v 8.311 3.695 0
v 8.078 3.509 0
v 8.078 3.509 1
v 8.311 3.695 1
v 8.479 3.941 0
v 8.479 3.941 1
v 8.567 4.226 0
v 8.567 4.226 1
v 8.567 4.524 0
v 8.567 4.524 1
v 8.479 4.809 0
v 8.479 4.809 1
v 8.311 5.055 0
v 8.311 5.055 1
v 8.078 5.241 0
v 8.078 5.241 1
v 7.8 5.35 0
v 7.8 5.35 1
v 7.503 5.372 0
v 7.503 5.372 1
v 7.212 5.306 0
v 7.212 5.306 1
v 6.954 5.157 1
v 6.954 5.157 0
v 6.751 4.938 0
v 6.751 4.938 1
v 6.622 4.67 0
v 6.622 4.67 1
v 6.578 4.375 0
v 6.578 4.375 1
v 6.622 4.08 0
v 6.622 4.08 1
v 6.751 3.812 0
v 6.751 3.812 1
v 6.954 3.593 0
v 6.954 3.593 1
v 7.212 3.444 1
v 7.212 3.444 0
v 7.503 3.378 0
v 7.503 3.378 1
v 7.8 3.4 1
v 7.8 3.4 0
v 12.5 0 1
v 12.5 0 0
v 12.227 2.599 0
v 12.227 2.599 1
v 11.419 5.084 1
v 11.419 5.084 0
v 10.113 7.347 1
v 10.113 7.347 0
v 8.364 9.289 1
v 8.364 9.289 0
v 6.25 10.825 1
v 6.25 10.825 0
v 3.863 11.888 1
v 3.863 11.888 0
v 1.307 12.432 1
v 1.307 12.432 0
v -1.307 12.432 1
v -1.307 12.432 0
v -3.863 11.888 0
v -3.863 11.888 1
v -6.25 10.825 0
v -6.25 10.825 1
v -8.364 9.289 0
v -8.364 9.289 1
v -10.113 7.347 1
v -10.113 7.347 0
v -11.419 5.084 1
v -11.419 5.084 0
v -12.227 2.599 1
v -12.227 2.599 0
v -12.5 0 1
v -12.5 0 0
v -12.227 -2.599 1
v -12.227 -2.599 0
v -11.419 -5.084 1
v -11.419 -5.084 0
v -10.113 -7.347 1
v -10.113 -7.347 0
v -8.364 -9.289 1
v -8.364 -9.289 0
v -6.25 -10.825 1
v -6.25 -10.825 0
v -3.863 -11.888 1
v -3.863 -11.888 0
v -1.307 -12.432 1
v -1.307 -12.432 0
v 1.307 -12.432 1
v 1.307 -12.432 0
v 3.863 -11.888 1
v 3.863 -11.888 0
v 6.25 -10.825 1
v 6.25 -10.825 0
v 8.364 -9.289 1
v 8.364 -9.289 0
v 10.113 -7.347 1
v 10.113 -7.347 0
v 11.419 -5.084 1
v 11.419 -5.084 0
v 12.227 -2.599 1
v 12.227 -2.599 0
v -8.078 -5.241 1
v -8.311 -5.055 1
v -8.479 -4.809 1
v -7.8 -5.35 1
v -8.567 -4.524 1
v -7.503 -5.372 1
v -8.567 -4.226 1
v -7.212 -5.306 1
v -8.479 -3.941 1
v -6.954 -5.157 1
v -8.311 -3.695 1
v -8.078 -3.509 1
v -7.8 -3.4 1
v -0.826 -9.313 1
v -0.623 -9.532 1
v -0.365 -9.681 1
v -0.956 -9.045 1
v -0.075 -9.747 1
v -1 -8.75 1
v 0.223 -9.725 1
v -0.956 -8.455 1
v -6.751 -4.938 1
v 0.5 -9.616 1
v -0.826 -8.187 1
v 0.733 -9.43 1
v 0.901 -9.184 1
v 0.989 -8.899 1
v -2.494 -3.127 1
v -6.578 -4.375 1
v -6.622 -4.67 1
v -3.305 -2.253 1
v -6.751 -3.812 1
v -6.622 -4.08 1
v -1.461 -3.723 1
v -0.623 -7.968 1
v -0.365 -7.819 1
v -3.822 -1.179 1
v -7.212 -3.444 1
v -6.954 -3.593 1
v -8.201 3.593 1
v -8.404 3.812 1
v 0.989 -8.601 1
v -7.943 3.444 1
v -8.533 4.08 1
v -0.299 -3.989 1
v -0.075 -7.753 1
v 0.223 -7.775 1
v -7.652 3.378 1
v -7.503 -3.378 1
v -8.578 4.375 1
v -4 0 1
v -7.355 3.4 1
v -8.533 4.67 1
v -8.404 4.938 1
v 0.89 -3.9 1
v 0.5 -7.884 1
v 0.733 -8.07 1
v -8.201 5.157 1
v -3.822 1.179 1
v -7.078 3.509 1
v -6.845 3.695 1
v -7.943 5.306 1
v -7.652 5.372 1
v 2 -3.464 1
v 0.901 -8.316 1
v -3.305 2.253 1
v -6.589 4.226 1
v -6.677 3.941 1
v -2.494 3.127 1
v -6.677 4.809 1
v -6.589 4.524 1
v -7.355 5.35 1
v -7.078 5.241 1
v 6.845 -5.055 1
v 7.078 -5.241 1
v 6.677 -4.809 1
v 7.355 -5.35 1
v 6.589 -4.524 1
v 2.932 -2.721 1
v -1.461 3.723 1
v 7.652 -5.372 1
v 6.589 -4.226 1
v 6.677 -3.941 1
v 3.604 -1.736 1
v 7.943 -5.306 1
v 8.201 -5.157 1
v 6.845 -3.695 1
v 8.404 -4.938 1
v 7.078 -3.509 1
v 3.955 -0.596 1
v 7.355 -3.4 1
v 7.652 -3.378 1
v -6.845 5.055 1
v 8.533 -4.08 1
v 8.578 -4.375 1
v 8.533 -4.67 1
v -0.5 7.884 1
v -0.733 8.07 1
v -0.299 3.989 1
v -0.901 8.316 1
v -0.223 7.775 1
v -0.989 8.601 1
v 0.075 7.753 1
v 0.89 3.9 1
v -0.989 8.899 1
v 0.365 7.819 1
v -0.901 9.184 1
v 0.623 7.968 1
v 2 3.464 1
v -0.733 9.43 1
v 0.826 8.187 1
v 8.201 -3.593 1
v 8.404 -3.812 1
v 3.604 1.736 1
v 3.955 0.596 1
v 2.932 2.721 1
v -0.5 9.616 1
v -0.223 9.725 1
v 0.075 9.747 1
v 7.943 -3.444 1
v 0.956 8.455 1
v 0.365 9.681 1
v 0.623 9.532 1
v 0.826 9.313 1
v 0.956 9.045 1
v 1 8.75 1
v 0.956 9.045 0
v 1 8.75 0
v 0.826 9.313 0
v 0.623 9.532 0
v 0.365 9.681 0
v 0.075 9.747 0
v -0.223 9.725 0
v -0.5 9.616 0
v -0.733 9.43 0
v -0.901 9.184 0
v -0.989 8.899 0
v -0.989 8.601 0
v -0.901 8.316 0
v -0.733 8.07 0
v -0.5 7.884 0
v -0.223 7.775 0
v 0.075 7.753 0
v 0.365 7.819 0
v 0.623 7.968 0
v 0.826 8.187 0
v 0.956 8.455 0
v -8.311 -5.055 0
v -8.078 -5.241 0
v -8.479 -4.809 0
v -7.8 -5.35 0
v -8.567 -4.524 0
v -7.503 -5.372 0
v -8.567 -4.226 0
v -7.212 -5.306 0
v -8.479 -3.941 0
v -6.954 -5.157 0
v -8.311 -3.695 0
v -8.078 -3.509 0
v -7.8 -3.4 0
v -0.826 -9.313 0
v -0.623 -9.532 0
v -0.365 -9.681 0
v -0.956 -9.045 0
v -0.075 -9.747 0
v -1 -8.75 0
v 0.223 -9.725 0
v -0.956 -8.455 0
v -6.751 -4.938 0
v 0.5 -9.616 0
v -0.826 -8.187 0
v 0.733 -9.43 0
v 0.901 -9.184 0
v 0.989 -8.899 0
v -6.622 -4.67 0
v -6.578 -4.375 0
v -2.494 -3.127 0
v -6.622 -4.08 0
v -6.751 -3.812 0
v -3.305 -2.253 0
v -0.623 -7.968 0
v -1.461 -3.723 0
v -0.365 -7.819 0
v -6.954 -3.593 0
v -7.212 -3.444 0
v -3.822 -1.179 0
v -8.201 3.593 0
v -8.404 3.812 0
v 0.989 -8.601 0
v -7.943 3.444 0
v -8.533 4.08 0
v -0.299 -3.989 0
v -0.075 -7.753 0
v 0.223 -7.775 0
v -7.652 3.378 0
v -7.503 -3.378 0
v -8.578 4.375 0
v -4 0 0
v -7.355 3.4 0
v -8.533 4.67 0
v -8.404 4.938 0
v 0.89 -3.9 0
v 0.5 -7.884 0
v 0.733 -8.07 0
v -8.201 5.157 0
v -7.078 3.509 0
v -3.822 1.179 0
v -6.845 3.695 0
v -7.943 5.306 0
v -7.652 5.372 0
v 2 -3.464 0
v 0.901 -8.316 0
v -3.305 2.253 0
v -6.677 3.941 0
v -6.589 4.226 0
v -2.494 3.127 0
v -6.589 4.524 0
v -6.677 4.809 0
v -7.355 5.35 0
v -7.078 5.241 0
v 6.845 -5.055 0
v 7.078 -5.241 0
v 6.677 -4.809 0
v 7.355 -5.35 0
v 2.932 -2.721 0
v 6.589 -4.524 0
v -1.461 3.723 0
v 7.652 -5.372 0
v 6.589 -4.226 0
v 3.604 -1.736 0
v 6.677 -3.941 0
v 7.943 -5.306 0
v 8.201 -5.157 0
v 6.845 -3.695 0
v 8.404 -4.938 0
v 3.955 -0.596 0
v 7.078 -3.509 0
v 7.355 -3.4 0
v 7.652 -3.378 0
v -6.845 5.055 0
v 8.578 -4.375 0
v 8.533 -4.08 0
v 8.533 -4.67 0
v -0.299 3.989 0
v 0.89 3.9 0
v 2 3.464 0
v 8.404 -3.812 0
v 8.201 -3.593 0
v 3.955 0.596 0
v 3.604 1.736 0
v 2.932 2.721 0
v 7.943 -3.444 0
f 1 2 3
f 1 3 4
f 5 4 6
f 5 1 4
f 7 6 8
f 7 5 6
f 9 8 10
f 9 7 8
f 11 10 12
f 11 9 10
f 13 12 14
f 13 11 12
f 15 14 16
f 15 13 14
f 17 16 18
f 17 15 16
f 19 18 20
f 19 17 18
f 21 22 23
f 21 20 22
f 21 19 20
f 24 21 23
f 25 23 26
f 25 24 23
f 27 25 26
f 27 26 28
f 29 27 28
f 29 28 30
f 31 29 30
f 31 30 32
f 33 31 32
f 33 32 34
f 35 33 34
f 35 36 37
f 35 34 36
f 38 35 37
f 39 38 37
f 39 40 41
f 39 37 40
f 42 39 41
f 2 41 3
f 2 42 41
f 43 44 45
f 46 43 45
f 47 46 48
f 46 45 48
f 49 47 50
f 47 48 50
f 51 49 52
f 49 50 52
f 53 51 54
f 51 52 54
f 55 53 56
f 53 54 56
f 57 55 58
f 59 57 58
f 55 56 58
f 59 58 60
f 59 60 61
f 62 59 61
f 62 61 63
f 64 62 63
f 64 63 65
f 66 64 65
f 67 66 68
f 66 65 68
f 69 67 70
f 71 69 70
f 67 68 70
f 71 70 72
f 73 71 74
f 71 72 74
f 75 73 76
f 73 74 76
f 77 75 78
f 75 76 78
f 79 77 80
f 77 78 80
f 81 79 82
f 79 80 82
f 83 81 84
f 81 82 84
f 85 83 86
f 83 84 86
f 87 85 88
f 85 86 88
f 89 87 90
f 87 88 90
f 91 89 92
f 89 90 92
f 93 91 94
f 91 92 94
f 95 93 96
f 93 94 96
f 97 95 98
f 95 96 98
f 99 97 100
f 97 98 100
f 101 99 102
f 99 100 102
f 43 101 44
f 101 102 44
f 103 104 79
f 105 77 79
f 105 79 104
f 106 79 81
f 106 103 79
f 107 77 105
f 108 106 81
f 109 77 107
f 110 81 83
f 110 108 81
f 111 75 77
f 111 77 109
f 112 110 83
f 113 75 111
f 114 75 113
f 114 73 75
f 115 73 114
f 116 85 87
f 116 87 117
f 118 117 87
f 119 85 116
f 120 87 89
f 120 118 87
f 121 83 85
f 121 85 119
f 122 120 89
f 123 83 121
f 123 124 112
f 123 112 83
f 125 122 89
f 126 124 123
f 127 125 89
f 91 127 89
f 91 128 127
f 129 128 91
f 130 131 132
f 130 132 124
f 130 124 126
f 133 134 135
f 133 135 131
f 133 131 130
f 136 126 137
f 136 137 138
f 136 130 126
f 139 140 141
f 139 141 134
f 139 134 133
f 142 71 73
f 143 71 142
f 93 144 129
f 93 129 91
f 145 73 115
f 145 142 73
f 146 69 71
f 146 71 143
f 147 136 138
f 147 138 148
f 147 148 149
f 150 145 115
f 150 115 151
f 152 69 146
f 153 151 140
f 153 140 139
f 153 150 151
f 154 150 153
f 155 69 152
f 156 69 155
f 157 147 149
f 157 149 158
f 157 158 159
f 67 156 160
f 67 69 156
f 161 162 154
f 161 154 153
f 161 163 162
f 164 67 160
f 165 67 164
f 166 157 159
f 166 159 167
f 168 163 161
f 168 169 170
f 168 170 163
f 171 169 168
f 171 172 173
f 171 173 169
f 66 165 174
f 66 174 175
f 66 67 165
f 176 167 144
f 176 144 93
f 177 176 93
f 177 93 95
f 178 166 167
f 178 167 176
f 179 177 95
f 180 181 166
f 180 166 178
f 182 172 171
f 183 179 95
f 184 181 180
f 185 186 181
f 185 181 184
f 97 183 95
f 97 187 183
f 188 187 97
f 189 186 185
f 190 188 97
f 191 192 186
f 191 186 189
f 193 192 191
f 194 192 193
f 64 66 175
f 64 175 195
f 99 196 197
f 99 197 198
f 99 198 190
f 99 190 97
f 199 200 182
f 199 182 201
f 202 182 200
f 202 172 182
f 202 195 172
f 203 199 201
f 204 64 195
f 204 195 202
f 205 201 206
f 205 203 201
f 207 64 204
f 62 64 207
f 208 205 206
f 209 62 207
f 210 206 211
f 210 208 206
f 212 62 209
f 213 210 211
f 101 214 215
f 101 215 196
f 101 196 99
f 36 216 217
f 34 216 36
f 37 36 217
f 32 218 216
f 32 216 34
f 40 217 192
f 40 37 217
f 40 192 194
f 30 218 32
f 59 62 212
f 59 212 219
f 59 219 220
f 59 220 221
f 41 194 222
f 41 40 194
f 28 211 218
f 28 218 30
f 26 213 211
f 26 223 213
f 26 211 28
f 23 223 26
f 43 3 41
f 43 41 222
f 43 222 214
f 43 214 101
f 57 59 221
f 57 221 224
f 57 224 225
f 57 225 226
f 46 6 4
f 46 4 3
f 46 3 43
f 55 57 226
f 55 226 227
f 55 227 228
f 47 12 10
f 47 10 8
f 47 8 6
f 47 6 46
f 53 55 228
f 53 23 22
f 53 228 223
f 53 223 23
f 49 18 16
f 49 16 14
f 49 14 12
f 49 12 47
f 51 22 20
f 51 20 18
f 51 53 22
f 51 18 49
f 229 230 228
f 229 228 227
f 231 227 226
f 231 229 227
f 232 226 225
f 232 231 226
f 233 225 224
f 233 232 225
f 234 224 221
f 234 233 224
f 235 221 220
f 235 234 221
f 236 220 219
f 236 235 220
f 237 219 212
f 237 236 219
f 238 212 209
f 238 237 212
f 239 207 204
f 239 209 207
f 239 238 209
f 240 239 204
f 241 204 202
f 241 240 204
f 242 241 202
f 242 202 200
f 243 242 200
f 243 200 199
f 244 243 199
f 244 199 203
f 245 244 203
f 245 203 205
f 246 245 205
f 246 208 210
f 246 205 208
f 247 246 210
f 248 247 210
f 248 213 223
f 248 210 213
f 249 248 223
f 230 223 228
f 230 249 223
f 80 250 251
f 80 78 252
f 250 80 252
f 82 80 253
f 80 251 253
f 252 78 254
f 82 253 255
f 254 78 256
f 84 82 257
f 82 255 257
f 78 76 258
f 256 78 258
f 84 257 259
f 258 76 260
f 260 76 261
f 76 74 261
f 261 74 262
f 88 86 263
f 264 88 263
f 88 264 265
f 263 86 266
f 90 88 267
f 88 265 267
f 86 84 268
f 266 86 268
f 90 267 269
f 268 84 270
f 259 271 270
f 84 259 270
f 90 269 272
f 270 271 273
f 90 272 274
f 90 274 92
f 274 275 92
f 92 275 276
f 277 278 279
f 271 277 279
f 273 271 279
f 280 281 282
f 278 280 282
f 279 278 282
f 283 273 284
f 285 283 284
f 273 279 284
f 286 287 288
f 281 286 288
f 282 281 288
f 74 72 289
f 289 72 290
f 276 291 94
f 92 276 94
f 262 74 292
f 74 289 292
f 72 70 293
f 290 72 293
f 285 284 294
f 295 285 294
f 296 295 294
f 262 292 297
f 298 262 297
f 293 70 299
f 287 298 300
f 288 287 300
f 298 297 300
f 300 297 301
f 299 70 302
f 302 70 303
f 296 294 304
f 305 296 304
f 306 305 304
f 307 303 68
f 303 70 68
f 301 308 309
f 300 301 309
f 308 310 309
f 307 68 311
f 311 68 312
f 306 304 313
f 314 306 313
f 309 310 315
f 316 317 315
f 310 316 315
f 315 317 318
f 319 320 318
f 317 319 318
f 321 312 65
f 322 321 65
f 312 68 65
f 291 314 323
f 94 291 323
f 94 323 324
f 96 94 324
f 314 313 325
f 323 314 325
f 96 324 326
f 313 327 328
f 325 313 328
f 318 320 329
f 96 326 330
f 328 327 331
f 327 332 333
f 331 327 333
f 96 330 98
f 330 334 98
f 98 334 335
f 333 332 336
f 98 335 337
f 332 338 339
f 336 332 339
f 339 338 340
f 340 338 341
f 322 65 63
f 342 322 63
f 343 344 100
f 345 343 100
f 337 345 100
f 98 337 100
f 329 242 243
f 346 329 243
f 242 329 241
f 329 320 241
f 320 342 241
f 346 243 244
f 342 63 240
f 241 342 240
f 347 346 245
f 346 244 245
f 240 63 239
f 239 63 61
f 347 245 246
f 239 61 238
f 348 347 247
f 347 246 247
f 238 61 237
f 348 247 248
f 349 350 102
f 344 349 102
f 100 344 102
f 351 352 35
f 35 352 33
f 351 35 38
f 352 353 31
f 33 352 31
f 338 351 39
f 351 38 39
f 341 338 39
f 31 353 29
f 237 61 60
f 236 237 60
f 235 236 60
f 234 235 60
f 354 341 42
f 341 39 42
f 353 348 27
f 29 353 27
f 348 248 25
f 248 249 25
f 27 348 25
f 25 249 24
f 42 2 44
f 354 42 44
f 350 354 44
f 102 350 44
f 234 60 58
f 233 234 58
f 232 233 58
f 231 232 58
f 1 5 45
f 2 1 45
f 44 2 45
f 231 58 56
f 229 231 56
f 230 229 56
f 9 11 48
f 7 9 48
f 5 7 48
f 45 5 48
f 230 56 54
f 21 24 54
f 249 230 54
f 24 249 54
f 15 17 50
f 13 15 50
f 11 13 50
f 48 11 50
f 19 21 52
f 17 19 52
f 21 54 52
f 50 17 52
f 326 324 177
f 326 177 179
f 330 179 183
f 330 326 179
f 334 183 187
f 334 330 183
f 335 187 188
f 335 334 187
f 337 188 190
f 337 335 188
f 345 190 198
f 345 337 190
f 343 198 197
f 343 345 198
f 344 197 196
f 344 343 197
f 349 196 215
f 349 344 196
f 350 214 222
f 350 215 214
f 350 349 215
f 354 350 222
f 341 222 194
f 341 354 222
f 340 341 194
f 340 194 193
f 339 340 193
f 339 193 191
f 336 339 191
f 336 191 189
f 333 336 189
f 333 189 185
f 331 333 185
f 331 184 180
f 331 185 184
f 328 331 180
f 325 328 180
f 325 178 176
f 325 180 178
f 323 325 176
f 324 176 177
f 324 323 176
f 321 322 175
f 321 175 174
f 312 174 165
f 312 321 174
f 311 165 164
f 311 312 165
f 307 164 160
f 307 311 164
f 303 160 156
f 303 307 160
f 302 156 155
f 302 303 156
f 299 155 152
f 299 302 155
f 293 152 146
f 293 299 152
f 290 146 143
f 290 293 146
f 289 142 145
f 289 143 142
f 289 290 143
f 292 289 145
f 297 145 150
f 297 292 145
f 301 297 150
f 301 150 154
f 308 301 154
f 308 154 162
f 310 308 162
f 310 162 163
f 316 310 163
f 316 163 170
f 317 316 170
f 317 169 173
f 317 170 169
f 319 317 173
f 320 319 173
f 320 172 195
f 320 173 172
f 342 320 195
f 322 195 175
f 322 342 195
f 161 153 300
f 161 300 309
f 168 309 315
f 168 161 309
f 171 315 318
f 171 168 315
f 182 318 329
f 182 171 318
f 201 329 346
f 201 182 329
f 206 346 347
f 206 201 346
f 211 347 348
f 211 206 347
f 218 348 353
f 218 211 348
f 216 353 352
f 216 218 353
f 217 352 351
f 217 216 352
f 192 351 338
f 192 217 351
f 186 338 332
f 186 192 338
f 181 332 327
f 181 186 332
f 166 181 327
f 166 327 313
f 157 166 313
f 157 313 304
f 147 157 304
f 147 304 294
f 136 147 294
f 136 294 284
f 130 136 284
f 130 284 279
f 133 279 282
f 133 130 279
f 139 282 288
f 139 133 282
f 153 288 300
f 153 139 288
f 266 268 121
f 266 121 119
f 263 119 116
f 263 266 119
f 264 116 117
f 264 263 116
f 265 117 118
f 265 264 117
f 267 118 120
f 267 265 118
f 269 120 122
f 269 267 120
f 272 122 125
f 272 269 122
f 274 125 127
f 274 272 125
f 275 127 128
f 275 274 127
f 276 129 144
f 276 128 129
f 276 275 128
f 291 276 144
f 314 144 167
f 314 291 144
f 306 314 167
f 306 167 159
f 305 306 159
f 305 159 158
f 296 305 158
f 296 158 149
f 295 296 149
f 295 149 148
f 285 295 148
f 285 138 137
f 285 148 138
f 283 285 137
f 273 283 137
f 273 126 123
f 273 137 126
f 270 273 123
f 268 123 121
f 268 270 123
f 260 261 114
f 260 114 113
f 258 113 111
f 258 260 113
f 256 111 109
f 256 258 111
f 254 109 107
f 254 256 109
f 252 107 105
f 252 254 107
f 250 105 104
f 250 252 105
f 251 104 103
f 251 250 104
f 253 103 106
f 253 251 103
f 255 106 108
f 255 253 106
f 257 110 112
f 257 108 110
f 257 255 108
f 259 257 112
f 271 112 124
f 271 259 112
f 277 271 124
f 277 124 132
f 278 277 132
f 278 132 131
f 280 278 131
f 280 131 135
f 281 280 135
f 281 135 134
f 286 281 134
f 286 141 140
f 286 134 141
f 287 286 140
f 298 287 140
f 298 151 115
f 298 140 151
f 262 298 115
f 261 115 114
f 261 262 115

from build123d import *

# Parameters (mm, degrees)
SKETCH1_R               = 12.5
BOSS_EXTRUDE1_DEPTH     = 1
CUT_EXTRUDE2_START      = -2
SKETCH2_R               = 1
CUT_EXTRUDE2_DEPTH      = 20.70593121
CIRPATTERN1_COUNT       = 6
CUT_EXTRUDE3_DEPTH      = 18.70593121
CUT_EXTRUDE3_DEPTH_BACK = 18.70593121
SKETCH4_R               = 4


with BuildPart() as part:
    # Sketch1 → Boss-Extrude1 (new body)
    with BuildSketch(Plane.XY):
        Circle(SKETCH1_R)
    extrude(amount=BOSS_EXTRUDE1_DEPTH)

    # Sketch2 → Cut-Extrude2 (cut)
    with BuildSketch(Plane.XY.offset(CUT_EXTRUDE2_START)):
        with Locations((0, 8.75)):
            Circle(SKETCH2_R)
    cut_extrude2 = extrude(amount=CUT_EXTRUDE2_DEPTH, mode=Mode.SUBTRACT)

    # CirPattern1: Cut-Extrude2 ×6 about axis
    cirpattern1_axis = Axis((0, 0, 0), (0, 0, 1))
    for i in range(1, CIRPATTERN1_COUNT):
        add(cut_extrude2.rotate(cirpattern1_axis, i * 360 / CIRPATTERN1_COUNT), mode=Mode.SUBTRACT)

    # Sketch4 → Cut-Extrude3 (cut, two sides: drawn at the far end of the back side and taken through both)
    with BuildSketch(Plane(origin=(0, 0, 0), x_dir=(-1, 0, 0), z_dir=(0, 0, -1)).offset(-CUT_EXTRUDE3_DEPTH_BACK)):
        Circle(SKETCH4_R)
    extrude(amount=CUT_EXTRUDE3_DEPTH + CUT_EXTRUDE3_DEPTH_BACK, mode=Mode.SUBTRACT)


solid = part.part
